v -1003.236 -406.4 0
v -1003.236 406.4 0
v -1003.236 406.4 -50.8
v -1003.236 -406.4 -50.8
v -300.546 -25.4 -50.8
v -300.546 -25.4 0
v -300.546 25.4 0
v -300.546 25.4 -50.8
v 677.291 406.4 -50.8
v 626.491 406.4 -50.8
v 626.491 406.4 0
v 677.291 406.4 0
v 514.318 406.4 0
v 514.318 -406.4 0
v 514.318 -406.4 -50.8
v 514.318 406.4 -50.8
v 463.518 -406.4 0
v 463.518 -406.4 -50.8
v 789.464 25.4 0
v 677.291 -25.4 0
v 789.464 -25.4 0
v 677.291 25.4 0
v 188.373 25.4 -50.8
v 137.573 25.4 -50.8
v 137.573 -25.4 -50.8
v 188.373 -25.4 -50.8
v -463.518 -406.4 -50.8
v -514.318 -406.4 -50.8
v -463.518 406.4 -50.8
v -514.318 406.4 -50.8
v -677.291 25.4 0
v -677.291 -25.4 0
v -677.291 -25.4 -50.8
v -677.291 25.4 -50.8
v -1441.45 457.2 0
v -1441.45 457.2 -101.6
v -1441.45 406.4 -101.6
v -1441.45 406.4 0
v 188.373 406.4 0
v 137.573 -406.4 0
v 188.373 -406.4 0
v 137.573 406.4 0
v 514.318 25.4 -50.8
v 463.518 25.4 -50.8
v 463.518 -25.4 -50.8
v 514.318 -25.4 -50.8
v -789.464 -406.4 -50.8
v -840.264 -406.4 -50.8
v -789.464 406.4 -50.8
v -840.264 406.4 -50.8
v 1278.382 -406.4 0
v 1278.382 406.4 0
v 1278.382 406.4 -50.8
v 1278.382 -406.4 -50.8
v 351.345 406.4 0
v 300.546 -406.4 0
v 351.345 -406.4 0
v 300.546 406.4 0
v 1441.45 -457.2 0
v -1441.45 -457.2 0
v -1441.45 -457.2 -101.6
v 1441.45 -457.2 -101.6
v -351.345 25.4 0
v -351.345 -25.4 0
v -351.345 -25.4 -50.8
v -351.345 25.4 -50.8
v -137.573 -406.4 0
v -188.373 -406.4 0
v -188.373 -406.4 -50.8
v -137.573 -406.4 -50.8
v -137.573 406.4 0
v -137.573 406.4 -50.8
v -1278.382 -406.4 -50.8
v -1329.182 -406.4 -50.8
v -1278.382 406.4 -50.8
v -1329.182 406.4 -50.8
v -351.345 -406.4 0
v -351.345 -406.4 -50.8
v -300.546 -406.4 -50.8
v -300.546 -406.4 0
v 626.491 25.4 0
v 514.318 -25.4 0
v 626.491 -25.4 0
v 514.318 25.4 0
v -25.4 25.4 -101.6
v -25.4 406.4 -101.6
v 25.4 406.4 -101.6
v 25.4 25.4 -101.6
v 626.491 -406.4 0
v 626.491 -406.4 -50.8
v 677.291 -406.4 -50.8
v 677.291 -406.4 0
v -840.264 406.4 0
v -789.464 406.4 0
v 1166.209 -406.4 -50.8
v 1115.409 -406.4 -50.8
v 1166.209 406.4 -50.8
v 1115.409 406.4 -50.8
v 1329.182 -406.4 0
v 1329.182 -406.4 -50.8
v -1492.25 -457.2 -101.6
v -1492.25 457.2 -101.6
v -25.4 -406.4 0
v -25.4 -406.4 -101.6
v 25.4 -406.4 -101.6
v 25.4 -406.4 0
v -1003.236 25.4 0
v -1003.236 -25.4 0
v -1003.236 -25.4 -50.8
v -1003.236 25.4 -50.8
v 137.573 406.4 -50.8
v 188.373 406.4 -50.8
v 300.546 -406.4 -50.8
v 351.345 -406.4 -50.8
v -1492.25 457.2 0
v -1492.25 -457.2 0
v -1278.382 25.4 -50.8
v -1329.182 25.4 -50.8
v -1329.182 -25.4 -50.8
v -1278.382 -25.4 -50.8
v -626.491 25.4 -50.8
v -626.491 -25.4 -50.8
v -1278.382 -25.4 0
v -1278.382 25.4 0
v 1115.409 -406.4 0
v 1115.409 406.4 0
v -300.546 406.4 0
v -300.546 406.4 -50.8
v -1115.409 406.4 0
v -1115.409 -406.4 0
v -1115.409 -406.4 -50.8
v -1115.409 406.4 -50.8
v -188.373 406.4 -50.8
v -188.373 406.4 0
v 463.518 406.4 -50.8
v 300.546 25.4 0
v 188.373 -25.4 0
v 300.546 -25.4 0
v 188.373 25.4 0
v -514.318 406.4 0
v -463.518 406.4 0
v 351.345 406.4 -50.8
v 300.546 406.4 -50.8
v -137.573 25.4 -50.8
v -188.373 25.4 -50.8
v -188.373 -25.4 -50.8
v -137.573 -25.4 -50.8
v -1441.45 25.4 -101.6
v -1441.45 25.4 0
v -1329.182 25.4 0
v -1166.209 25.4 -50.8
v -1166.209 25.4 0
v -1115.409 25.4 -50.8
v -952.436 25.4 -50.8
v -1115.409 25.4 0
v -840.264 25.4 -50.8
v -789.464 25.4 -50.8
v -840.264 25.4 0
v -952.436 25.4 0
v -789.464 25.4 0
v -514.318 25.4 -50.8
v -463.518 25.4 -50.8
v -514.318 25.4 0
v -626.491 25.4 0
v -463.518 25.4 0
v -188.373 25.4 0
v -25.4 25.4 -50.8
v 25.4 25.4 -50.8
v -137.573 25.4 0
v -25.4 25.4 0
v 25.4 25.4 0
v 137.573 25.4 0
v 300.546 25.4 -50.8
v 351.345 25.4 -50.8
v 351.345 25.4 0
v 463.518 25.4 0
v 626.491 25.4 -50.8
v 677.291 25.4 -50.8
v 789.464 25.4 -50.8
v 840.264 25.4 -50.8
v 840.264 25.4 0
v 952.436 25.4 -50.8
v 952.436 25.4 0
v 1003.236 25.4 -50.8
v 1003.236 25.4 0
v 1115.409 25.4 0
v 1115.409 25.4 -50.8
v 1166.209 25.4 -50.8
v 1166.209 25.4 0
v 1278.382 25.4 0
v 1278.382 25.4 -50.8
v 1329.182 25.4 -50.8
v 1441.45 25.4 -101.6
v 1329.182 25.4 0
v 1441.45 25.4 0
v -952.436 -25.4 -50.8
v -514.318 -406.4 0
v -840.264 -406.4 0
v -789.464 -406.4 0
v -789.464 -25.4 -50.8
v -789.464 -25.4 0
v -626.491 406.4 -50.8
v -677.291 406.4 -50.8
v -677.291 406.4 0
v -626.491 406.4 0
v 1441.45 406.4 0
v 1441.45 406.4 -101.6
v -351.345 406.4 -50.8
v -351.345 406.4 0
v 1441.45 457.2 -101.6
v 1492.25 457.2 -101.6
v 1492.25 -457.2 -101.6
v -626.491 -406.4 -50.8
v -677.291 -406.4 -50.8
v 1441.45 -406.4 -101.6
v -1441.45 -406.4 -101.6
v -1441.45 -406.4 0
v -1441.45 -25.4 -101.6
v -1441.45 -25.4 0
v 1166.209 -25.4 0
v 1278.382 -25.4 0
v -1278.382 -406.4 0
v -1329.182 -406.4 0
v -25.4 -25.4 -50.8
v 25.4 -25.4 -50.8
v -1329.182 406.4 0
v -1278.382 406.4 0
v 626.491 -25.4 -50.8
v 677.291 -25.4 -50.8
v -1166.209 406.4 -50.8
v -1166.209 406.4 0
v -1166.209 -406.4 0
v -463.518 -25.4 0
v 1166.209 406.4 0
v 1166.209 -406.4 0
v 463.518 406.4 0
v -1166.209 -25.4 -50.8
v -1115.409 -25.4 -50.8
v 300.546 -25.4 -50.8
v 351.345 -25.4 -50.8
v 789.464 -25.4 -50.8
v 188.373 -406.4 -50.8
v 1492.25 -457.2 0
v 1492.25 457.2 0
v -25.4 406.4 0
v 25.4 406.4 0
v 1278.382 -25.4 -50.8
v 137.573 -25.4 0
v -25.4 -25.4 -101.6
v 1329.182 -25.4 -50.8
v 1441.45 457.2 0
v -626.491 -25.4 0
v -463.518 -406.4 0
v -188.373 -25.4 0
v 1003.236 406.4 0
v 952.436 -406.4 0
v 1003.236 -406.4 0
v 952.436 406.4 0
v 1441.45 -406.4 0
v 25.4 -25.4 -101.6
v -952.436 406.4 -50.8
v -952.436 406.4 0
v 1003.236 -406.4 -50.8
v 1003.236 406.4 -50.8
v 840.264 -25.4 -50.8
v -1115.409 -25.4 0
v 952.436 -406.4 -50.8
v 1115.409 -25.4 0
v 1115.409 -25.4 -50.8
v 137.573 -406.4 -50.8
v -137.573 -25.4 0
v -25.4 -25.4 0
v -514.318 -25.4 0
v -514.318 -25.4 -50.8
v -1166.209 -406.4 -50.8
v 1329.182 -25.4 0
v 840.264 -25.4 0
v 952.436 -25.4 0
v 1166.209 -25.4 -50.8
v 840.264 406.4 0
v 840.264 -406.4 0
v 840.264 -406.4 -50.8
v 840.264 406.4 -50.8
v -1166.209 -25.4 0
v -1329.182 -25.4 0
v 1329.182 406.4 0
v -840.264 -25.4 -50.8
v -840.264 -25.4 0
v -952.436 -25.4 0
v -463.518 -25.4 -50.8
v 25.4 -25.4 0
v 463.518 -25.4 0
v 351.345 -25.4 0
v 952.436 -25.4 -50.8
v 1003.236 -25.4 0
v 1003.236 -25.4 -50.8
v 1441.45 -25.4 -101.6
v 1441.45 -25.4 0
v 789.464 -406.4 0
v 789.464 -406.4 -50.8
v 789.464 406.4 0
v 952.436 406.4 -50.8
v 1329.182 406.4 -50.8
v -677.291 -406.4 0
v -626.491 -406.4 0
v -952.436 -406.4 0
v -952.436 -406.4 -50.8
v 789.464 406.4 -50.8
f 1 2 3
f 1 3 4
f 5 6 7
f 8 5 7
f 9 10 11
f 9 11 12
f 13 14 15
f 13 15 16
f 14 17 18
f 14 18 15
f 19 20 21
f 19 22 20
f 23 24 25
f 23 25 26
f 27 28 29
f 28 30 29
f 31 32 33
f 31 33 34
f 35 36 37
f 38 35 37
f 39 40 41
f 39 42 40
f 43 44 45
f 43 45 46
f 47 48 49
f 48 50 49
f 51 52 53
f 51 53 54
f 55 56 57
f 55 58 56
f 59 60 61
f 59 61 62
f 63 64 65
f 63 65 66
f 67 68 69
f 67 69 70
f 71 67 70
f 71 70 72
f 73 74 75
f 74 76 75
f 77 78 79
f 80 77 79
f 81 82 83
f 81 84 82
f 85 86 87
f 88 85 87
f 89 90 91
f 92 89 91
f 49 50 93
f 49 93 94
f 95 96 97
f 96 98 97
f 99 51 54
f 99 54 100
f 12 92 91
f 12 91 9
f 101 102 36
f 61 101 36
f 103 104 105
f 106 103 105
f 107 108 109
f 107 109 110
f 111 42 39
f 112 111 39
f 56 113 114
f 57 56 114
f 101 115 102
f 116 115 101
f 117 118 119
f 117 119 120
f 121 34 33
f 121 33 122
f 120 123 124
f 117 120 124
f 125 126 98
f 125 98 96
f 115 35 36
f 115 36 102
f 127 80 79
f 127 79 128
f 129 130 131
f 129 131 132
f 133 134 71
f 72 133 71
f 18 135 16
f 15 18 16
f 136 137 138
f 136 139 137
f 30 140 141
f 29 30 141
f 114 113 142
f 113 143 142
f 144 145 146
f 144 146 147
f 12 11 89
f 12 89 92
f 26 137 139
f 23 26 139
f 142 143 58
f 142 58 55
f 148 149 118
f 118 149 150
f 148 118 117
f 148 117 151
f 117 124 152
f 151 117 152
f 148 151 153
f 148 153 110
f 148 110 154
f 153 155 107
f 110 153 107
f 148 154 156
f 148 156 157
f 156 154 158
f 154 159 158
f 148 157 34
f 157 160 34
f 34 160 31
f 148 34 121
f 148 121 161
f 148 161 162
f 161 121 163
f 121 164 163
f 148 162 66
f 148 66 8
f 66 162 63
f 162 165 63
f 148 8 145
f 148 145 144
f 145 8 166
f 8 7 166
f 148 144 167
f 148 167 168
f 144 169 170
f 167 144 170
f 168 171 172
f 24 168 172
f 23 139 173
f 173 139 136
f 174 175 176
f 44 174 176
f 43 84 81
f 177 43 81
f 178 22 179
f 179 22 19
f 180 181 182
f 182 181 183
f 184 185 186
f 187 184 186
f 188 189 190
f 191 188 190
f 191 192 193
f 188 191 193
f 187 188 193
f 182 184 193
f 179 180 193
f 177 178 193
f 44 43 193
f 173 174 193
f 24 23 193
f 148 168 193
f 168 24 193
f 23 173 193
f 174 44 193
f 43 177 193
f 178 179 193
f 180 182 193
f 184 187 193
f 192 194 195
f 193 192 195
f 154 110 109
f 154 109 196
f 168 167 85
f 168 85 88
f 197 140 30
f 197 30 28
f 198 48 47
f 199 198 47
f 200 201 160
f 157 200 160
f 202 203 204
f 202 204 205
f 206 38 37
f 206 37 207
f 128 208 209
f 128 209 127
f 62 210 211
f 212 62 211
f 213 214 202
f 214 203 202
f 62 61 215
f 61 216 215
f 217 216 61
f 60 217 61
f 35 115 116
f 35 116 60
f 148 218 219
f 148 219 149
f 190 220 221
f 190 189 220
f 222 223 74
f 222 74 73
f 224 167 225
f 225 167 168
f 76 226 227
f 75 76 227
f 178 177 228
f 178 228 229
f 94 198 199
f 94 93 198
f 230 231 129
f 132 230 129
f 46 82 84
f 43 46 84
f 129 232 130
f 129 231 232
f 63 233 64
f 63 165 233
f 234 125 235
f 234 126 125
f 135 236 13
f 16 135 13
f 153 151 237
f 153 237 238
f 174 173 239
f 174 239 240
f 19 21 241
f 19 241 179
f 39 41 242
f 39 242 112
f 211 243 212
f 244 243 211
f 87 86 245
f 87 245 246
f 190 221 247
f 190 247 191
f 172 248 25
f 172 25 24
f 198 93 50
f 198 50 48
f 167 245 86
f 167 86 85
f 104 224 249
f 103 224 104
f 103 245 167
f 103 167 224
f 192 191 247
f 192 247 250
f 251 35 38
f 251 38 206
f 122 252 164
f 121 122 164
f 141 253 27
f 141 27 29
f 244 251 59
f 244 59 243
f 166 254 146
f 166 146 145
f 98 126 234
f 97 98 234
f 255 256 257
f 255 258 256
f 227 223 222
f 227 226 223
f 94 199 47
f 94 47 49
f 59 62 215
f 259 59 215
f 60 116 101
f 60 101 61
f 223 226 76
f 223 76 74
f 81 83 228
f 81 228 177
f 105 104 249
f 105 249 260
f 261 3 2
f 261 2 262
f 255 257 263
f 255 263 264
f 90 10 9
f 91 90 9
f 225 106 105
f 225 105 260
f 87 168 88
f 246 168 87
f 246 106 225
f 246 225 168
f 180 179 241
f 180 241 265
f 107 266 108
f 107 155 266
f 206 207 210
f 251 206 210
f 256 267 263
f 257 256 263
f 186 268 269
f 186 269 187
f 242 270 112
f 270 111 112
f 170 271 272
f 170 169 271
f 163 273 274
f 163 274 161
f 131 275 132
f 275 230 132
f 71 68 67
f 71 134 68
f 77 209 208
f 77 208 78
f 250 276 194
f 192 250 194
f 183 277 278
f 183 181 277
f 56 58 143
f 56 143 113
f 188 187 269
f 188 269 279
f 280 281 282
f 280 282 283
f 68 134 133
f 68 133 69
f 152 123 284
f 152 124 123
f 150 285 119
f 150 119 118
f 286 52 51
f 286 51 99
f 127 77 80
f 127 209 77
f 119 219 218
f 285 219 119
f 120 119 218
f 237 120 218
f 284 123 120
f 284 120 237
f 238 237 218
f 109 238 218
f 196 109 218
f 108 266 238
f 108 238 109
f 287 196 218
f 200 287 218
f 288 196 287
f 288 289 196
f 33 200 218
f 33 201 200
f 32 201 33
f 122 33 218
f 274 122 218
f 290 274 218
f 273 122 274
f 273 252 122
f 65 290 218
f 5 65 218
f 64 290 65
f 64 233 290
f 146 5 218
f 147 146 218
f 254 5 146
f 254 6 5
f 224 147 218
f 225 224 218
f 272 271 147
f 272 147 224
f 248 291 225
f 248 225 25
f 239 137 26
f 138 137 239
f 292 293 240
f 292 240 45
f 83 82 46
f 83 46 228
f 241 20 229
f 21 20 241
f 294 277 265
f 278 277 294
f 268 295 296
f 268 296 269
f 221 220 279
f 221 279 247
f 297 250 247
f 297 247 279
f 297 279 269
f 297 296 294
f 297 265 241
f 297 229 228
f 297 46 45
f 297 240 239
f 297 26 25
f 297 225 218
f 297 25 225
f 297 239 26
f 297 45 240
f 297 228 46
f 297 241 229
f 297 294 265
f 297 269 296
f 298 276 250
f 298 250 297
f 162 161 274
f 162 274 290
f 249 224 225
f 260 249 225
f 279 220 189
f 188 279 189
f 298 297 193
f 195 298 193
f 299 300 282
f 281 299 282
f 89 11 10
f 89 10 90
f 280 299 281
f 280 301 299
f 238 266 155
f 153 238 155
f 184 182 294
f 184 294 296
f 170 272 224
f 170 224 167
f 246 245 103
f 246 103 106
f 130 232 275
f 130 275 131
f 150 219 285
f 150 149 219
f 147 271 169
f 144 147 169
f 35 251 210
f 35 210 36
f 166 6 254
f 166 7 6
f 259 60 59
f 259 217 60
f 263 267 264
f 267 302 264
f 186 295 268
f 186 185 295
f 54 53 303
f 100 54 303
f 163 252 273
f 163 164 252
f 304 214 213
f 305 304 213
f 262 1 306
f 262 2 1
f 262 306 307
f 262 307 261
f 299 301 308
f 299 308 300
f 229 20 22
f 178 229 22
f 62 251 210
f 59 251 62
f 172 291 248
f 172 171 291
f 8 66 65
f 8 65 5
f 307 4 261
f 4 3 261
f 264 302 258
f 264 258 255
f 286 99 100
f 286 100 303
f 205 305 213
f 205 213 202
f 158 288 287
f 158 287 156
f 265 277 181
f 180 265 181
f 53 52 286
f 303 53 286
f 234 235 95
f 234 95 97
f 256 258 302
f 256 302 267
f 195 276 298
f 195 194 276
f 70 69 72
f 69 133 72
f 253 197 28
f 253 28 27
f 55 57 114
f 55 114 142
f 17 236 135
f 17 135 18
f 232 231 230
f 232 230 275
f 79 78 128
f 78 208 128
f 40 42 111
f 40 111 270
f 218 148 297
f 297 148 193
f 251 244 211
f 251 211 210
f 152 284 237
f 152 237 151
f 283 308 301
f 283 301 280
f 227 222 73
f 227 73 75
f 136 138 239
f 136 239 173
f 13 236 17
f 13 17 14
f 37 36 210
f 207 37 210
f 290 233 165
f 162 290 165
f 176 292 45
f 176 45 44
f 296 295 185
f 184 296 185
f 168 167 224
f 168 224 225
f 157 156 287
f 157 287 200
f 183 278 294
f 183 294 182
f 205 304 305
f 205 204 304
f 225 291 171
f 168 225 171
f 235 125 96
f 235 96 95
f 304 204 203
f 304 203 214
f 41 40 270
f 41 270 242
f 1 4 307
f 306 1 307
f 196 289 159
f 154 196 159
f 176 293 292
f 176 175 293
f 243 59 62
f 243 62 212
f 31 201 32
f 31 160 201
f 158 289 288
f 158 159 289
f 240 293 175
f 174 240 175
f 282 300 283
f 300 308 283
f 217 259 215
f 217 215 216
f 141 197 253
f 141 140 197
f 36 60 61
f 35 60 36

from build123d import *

# Parameters (mm, degrees)
F0_W     = 50.8
F0_H     = 381
F0_H_2   = 50.8
F1_DEPTH = 50.8
F0_W_2   = 112.17275
F2_DEPTH = 101.6
F3_DEPTH = 101.6
F0_W_3   = 112.268
F4_DEPTH = 101.6
F5_DEPTH = 50.8


# Not quite as in the source:
# - a feature names something its author has since deleted; it is built from what else it names


with BuildPart() as f1:
    # F0 (on Top) → F1 (new body)
    with BuildSketch(Plane.XY):
        with Locations((1303.782, 215.9)):
            Rectangle(F0_W, F0_H)
        with Locations((1303.782, -215.9)):
            Rectangle(F0_W, F0_H)
        with Locations((1303.782, 0)):
            Rectangle(F0_W, F0_H_2)
    extrude(amount=-F1_DEPTH)


with BuildPart() as f1b:
    # F0 (on Top) → F1, piece 2 (new body)
    with BuildSketch(Plane.XY):
        with Locations((1140.80925, -215.9)):
            Rectangle(F0_W, F0_H)
        with Locations((1140.80925, 0)):
            Rectangle(F0_W, F0_H_2)
        with Locations((1140.80925, 215.9)):
            Rectangle(F0_W, F0_H)
    extrude(amount=-F1_DEPTH)


with BuildPart() as f1c:
    # F0 (on Top) → F1, piece 3 (new body)
    with BuildSketch(Plane.XY):
        with Locations((977.8365, -215.9)):
            Rectangle(F0_W, F0_H)
        with Locations((977.8365, 0)):
            Rectangle(F0_W, F0_H_2)
        with Locations((977.8365, 215.9)):
            Rectangle(F0_W, F0_H)
    extrude(amount=-F1_DEPTH)


with BuildPart() as f1d:
    # F0 (on Top) → F1, piece 4 (new body)
    with BuildSketch(Plane.XY):
        with Locations((651.891, 0)):
            Rectangle(F0_W, F0_H_2)
        with Locations((651.891, 215.9)):
            Rectangle(F0_W, F0_H)
        with Locations((651.891, -215.9)):
            Rectangle(F0_W, F0_H)
    extrude(amount=-F1_DEPTH)


with BuildPart() as f1e:
    # F0 (on Top) → F1, piece 5 (new body)
    with BuildSketch(Plane.XY):
        with Locations((488.91825, 0)):
            Rectangle(F0_W, F0_H_2)
        with Locations((488.91825, 215.9)):
            Rectangle(F0_W, F0_H)
        with Locations((488.91825, -215.9)):
            Rectangle(F0_W, F0_H)
    extrude(amount=-F1_DEPTH)


with BuildPart() as f1f:
    # F0 (on Top) → F1, piece 6 (new body)
    with BuildSketch(Plane.XY):
        with Locations((325.9455, 0)):
            Rectangle(F0_W, F0_H_2)
        with Locations((325.9455, -215.9)):
            Rectangle(F0_W, F0_H)
        with Locations((325.9455, 215.9)):
            Rectangle(F0_W, F0_H)
    extrude(amount=-F1_DEPTH)


with BuildPart() as f1g:
    # F0 (on Top) → F1, piece 7 (new body)
    with BuildSketch(Plane.XY):
        with Locations((162.97275, -215.9)):
            Rectangle(F0_W, F0_H)
        with Locations((162.97275, 215.9)):
            Rectangle(F0_W, F0_H)
        with Locations((162.97275, 0)):
            Rectangle(F0_W, F0_H_2)
    extrude(amount=-F1_DEPTH)


with BuildPart() as f1h:
    # F0 (on Top) → F1, piece 8 (new body)
    with BuildSketch(Plane.XY):
        with Locations((0, 215.9)):
            Rectangle(F0_W, F0_H)
        with Locations((0, -215.9)):
            Rectangle(F0_W, F0_H)
        Rectangle(F0_W, F0_H_2)
    extrude(amount=-F1_DEPTH)

    # F0 (on Top) → F2, piece 2 (join)
    with BuildSketch(Plane.XY):
        with Locations((0, 215.9)):
            Rectangle(F0_W, F0_H)
        with Locations((0, -215.9)):
            Rectangle(F0_W, F0_H)
    extrude(amount=-F2_DEPTH)


with BuildPart() as f1i:
    # F0 (on Top) → F1, piece 9 (new body)
    with BuildSketch(Plane.XY):
        with Locations((-162.97275, -215.9)):
            Rectangle(F0_W, F0_H)
        with Locations((-162.97275, 0)):
            Rectangle(F0_W, F0_H_2)
        with Locations((-162.97275, 215.9)):
            Rectangle(F0_W, F0_H)
    extrude(amount=-F1_DEPTH)


with BuildPart() as f1j:
    # F0 (on Top) → F1, piece 10 (new body)
    with BuildSketch(Plane.XY):
        with Locations((-488.91825, -215.9)):
            Rectangle(F0_W, F0_H)
        with Locations((-488.91825, 215.9)):
            Rectangle(F0_W, F0_H)
        with Locations((-488.91825, 0)):
            Rectangle(F0_W, F0_H_2)
    extrude(amount=-F1_DEPTH)


with BuildPart() as f1k:
    # F0 (on Top) → F1, piece 11 (new body)
    with BuildSketch(Plane.XY):
        with Locations((-814.86375, 0)):
            Rectangle(F0_W, F0_H_2)
        with Locations((-814.86375, -215.9)):
            Rectangle(F0_W, F0_H)
        with Locations((-814.86375, 215.9)):
            Rectangle(F0_W, F0_H)
    extrude(amount=-F1_DEPTH)


with BuildPart() as f1l:
    # F0 (on Top) → F1, piece 12 (new body)
    with BuildSketch(Plane.XY):
        with Locations((-977.8365, -215.9)):
            Rectangle(F0_W, F0_H)
        with Locations((-977.8365, 215.9)):
            Rectangle(F0_W, F0_H)
        with Locations((-977.8365, 0)):
            Rectangle(F0_W, F0_H_2)
    extrude(amount=-F1_DEPTH)


with BuildPart() as f1m:
    # F0 (on Top) → F1, piece 13 (new body)
    with BuildSketch(Plane.XY):
        with Locations((-1140.80925, -215.9)):
            Rectangle(F0_W, F0_H)
        with Locations((-1140.80925, 215.9)):
            Rectangle(F0_W, F0_H)
        with Locations((-1140.80925, 0)):
            Rectangle(F0_W, F0_H_2)
    extrude(amount=-F1_DEPTH)


with BuildPart() as f1n:
    # F0 (on Top) → F1, piece 14 (new body)
    with BuildSketch(Plane.XY):
        with Locations((-1303.782, -215.9)):
            Rectangle(F0_W, F0_H)
        with Locations((-1303.782, 0)):
            Rectangle(F0_W, F0_H_2)
        with Locations((-1303.782, 215.9)):
            Rectangle(F0_W, F0_H)
    extrude(amount=-F1_DEPTH)


with BuildPart() as f1o:
    # F0 (on Top) → F1, piece 15 (new body)
    with BuildSketch(Plane.XY):
        with Locations((-325.9455, -215.9)):
            Rectangle(F0_W, F0_H)
        with Locations((-325.9455, 0)):
            Rectangle(F0_W, F0_H_2)
        with Locations((-325.9455, 215.9)):
            Rectangle(F0_W, F0_H)
    extrude(amount=-F1_DEPTH)


with BuildPart() as f1p:
    # F0 (on Top) → F1, piece 16 (new body)
    with BuildSketch(Plane.XY):
        with Locations((-651.891, -215.9)):
            Rectangle(F0_W, F0_H)
        with Locations((-651.891, 215.9)):
            Rectangle(F0_W, F0_H)
        with Locations((-651.891, 0)):
            Rectangle(F0_W, F0_H_2)
    extrude(amount=-F1_DEPTH)


with BuildPart() as f1q:
    # F0 (on Top) → F1, piece 17 (new body)
    with BuildSketch(Plane.XY):
        with Locations((814.86375, -215.9)):
            Rectangle(F0_W, F0_H)
        with Locations((814.86375, 215.9)):
            Rectangle(F0_W, F0_H)
        with Locations((814.86375, 0)):
            Rectangle(F0_W, F0_H_2)
    extrude(amount=-F1_DEPTH)


with BuildPart() as f2:
    # F0 (on Top) → F2 (new body)
    with BuildSketch(Plane.XY):
        with Locations((1303.782, 0)):
            Rectangle(F0_W, F0_H_2)
        with Locations((1222.295625, 0)):
            Rectangle(F0_W_2, F0_H_2)
    extrude(amount=-F2_DEPTH)

    # F0 (on Top) → F4 (join)
    with BuildSketch(Plane.XY):
        with Locations((1385.316, 0)):
            Rectangle(F0_W_3, F0_H_2)
        with Locations((1140.80925, 0)):
            Rectangle(F0_W, F0_H_2)
        with Locations((977.8365, 0)):
            Rectangle(F0_W, F0_H_2)
        with Locations((1059.322875, 0)):
            Rectangle(F0_W_2, F0_H_2)
        with Locations((896.350125, 0)):
            Rectangle(F0_W_2, F0_H_2)
        with Locations((814.86375, 0)):
            Rectangle(F0_W, F0_H_2)
        with Locations((570.404625, 0)):
            Rectangle(F0_W_2, F0_H_2)
        with Locations((-325.9455, 0)):
            Rectangle(F0_W, F0_H_2)
        with Locations((325.9455, 0)):
            Rectangle(F0_W, F0_H_2)
        with Locations((407.431875, 0)):
            Rectangle(F0_W_2, F0_H_2)
        with Locations((651.891, 0)):
            Rectangle(F0_W, F0_H_2)
        with Locations((-244.459125, 0)):
            Rectangle(F0_W_2, F0_H_2)
        with Locations((-896.350125, 0)):
            Rectangle(F0_W_2, F0_H_2)
        with Locations((-977.8365, 0)):
            Rectangle(F0_W, F0_H_2)
        with Locations((-1222.295625, 0)):
            Rectangle(F0_W_2, F0_H_2)
        with Locations((-162.97275, 0)):
            Rectangle(F0_W, F0_H_2)
        with Locations((81.486375, 0)):
            Rectangle(F0_W_2, F0_H_2)
        with Locations((-81.486375, 0)):
            Rectangle(F0_W_2, F0_H_2)
        with Locations((-1059.322875, 0)):
            Rectangle(F0_W_2, F0_H_2)
        with Locations((244.459125, 0)):
            Rectangle(F0_W_2, F0_H_2)
        with Locations((-1385.316, 0)):
            Rectangle(F0_W_3, F0_H_2)
        with Locations((-1140.80925, 0)):
            Rectangle(F0_W, F0_H_2)
        with Locations((162.97275, 0)):
            Rectangle(F0_W, F0_H_2)
        with Locations((-814.86375, 0)):
            Rectangle(F0_W, F0_H_2)
        Rectangle(F0_W, F0_H_2)
        with Locations((-488.91825, 0)):
            Rectangle(F0_W, F0_H_2)
        with Locations((-407.431875, 0)):
            Rectangle(F0_W_2, F0_H_2)
        with Locations((733.377375, 0)):
            Rectangle(F0_W_2, F0_H_2)
        with Locations((-1303.782, 0)):
            Rectangle(F0_W, F0_H_2)
        with Locations((-570.404625, 0)):
            Rectangle(F0_W_2, F0_H_2)
        with Locations((-733.377375, 0)):
            Rectangle(F0_W_2, F0_H_2)
        with Locations((-651.891, 0)):
            Rectangle(F0_W, F0_H_2)
        with Locations((488.91825, 0)):
            Rectangle(F0_W, F0_H_2)
    extrude(amount=-F4_DEPTH)

    # F0 (on Top) → F5 (cut)
    with BuildSketch(Plane.XY):
        with Locations((1303.782, 0)):
            Rectangle(F0_W, F0_H_2)
        with Locations((1140.80925, 0)):
            Rectangle(F0_W, F0_H_2)
        with Locations((977.8365, 0)):
            Rectangle(F0_W, F0_H_2)
        with Locations((814.86375, 0)):
            Rectangle(F0_W, F0_H_2)
        with Locations((651.891, 0)):
            Rectangle(F0_W, F0_H_2)
        with Locations((488.91825, 0)):
            Rectangle(F0_W, F0_H_2)
        with Locations((325.9455, 0)):
            Rectangle(F0_W, F0_H_2)
        with Locations((162.97275, 0)):
            Rectangle(F0_W, F0_H_2)
        Rectangle(F0_W, F0_H_2)
        with Locations((-162.97275, 0)):
            Rectangle(F0_W, F0_H_2)
        with Locations((-325.9455, 0)):
            Rectangle(F0_W, F0_H_2)
        with Locations((-488.91825, 0)):
            Rectangle(F0_W, F0_H_2)
        with Locations((-651.891, 0)):
            Rectangle(F0_W, F0_H_2)
        with Locations((-814.86375, 0)):
            Rectangle(F0_W, F0_H_2)
        with Locations((-977.8365, 0)):
            Rectangle(F0_W, F0_H_2)
        with Locations((-1140.80925, 0)):
            Rectangle(F0_W, F0_H_2)
        with Locations((-1303.782, 0)):
            Rectangle(F0_W, F0_H_2)
    extrude(amount=-F5_DEPTH, mode=Mode.SUBTRACT)


with BuildPart() as f3:
    # F0 (on Top) → F3 (new body)
    with BuildSketch(Plane.XY):
        Polygon((-1441.45, 406.4), (-1441.45, 457.2), (-1492.25, 457.2), (-1492.25, -457.2), (-1441.45, -457.2), (-1441.45, -406.4), (-1441.45, -25.4), (-1441.45, 25.4), align=None)
    extrude(amount=-F3_DEPTH)


with BuildPart() as f3b:
    # F0 (on Top) → F3, piece 2 (new body)
    with BuildSketch(Plane.XY):
        Polygon((1492.25, -457.2), (1492.25, 457.2), (1441.45, 457.2), (1441.45, 406.4), (1441.45, 25.4), (1441.45, -25.4), (1441.45, -406.4), (1441.45, -457.2), align=None)
    extrude(amount=-F3_DEPTH)


with BuildPart() as f4:
    # F0 (on Top) → F4, piece 2 (new body)
    with BuildSketch(Plane.XY):
        Polygon((1441.45, 406.4), (1441.45, 457.2), (-1441.45, 457.2), (-1441.45, 406.4), (-1329.182, 406.4), (-1278.382, 406.4), (-1166.20925, 406.4), (-1115.40925, 406.4), (-1003.2365, 406.4), (-952.4365, 406.4), (-840.26375, 406.4), (-789.46375, 406.4), (-677.291, 406.4), (-626.491, 406.4), (-514.31825, 406.4), (-463.51825, 406.4), (-351.3455, 406.4), (-300.5455, 406.4), (-188.37275, 406.4), (-137.57275, 406.4), (-25.4, 406.4), (25.4, 406.4), (137.57275, 406.4), (188.37275, 406.4), (300.5455, 406.4), (351.3455, 406.4), (463.51825, 406.4), (514.31825, 406.4), (626.491, 406.4), (677.291, 406.4), (789.46375, 406.4), (840.26375, 406.4), (952.4365, 406.4), (1003.2365, 406.4), (1115.40925, 406.4), (1166.20925, 406.4), (1278.382, 406.4), (1329.182, 406.4), align=None)
    extrude(amount=-F4_DEPTH)


with BuildPart() as f4b:
    # F0 (on Top) → F4, piece 3 (new body)
    with BuildSketch(Plane.XY):
        Polygon((-1441.45, -457.2), (1441.45, -457.2), (1441.45, -406.4), (1329.182, -406.4), (1278.382, -406.4), (1166.20925, -406.4), (1115.40925, -406.4), (1003.2365, -406.4), (952.4365, -406.4), (840.26375, -406.4), (789.46375, -406.4), (677.291, -406.4), (626.491, -406.4), (514.31825, -406.4), (463.51825, -406.4), (351.3455, -406.4), (300.5455, -406.4), (188.37275, -406.4), (137.57275, -406.4), (25.4, -406.4), (-25.4, -406.4), (-137.57275, -406.4), (-188.37275, -406.4), (-300.5455, -406.4), (-351.3455, -406.4), (-463.51825, -406.4), (-514.31825, -406.4), (-626.491, -406.4), (-677.291, -406.4), (-789.46375, -406.4), (-840.26375, -406.4), (-952.4365, -406.4), (-1003.2365, -406.4), (-1115.40925, -406.4), (-1166.20925, -406.4), (-1278.382, -406.4), (-1329.182, -406.4), (-1441.45, -406.4), align=None)
    extrude(amount=-F4_DEPTH)


solid = Compound([f1.part, f1b.part, f1c.part, f1d.part, f1e.part, f1f.part, f1g.part, f1h.part, f1i.part, f1j.part, f1k.part, f1l.part, f1m.part, f1n.part, f1o.part, f1p.part, f1q.part, f2.part, f3.part, f3b.part, f4.part, f4b.part])
